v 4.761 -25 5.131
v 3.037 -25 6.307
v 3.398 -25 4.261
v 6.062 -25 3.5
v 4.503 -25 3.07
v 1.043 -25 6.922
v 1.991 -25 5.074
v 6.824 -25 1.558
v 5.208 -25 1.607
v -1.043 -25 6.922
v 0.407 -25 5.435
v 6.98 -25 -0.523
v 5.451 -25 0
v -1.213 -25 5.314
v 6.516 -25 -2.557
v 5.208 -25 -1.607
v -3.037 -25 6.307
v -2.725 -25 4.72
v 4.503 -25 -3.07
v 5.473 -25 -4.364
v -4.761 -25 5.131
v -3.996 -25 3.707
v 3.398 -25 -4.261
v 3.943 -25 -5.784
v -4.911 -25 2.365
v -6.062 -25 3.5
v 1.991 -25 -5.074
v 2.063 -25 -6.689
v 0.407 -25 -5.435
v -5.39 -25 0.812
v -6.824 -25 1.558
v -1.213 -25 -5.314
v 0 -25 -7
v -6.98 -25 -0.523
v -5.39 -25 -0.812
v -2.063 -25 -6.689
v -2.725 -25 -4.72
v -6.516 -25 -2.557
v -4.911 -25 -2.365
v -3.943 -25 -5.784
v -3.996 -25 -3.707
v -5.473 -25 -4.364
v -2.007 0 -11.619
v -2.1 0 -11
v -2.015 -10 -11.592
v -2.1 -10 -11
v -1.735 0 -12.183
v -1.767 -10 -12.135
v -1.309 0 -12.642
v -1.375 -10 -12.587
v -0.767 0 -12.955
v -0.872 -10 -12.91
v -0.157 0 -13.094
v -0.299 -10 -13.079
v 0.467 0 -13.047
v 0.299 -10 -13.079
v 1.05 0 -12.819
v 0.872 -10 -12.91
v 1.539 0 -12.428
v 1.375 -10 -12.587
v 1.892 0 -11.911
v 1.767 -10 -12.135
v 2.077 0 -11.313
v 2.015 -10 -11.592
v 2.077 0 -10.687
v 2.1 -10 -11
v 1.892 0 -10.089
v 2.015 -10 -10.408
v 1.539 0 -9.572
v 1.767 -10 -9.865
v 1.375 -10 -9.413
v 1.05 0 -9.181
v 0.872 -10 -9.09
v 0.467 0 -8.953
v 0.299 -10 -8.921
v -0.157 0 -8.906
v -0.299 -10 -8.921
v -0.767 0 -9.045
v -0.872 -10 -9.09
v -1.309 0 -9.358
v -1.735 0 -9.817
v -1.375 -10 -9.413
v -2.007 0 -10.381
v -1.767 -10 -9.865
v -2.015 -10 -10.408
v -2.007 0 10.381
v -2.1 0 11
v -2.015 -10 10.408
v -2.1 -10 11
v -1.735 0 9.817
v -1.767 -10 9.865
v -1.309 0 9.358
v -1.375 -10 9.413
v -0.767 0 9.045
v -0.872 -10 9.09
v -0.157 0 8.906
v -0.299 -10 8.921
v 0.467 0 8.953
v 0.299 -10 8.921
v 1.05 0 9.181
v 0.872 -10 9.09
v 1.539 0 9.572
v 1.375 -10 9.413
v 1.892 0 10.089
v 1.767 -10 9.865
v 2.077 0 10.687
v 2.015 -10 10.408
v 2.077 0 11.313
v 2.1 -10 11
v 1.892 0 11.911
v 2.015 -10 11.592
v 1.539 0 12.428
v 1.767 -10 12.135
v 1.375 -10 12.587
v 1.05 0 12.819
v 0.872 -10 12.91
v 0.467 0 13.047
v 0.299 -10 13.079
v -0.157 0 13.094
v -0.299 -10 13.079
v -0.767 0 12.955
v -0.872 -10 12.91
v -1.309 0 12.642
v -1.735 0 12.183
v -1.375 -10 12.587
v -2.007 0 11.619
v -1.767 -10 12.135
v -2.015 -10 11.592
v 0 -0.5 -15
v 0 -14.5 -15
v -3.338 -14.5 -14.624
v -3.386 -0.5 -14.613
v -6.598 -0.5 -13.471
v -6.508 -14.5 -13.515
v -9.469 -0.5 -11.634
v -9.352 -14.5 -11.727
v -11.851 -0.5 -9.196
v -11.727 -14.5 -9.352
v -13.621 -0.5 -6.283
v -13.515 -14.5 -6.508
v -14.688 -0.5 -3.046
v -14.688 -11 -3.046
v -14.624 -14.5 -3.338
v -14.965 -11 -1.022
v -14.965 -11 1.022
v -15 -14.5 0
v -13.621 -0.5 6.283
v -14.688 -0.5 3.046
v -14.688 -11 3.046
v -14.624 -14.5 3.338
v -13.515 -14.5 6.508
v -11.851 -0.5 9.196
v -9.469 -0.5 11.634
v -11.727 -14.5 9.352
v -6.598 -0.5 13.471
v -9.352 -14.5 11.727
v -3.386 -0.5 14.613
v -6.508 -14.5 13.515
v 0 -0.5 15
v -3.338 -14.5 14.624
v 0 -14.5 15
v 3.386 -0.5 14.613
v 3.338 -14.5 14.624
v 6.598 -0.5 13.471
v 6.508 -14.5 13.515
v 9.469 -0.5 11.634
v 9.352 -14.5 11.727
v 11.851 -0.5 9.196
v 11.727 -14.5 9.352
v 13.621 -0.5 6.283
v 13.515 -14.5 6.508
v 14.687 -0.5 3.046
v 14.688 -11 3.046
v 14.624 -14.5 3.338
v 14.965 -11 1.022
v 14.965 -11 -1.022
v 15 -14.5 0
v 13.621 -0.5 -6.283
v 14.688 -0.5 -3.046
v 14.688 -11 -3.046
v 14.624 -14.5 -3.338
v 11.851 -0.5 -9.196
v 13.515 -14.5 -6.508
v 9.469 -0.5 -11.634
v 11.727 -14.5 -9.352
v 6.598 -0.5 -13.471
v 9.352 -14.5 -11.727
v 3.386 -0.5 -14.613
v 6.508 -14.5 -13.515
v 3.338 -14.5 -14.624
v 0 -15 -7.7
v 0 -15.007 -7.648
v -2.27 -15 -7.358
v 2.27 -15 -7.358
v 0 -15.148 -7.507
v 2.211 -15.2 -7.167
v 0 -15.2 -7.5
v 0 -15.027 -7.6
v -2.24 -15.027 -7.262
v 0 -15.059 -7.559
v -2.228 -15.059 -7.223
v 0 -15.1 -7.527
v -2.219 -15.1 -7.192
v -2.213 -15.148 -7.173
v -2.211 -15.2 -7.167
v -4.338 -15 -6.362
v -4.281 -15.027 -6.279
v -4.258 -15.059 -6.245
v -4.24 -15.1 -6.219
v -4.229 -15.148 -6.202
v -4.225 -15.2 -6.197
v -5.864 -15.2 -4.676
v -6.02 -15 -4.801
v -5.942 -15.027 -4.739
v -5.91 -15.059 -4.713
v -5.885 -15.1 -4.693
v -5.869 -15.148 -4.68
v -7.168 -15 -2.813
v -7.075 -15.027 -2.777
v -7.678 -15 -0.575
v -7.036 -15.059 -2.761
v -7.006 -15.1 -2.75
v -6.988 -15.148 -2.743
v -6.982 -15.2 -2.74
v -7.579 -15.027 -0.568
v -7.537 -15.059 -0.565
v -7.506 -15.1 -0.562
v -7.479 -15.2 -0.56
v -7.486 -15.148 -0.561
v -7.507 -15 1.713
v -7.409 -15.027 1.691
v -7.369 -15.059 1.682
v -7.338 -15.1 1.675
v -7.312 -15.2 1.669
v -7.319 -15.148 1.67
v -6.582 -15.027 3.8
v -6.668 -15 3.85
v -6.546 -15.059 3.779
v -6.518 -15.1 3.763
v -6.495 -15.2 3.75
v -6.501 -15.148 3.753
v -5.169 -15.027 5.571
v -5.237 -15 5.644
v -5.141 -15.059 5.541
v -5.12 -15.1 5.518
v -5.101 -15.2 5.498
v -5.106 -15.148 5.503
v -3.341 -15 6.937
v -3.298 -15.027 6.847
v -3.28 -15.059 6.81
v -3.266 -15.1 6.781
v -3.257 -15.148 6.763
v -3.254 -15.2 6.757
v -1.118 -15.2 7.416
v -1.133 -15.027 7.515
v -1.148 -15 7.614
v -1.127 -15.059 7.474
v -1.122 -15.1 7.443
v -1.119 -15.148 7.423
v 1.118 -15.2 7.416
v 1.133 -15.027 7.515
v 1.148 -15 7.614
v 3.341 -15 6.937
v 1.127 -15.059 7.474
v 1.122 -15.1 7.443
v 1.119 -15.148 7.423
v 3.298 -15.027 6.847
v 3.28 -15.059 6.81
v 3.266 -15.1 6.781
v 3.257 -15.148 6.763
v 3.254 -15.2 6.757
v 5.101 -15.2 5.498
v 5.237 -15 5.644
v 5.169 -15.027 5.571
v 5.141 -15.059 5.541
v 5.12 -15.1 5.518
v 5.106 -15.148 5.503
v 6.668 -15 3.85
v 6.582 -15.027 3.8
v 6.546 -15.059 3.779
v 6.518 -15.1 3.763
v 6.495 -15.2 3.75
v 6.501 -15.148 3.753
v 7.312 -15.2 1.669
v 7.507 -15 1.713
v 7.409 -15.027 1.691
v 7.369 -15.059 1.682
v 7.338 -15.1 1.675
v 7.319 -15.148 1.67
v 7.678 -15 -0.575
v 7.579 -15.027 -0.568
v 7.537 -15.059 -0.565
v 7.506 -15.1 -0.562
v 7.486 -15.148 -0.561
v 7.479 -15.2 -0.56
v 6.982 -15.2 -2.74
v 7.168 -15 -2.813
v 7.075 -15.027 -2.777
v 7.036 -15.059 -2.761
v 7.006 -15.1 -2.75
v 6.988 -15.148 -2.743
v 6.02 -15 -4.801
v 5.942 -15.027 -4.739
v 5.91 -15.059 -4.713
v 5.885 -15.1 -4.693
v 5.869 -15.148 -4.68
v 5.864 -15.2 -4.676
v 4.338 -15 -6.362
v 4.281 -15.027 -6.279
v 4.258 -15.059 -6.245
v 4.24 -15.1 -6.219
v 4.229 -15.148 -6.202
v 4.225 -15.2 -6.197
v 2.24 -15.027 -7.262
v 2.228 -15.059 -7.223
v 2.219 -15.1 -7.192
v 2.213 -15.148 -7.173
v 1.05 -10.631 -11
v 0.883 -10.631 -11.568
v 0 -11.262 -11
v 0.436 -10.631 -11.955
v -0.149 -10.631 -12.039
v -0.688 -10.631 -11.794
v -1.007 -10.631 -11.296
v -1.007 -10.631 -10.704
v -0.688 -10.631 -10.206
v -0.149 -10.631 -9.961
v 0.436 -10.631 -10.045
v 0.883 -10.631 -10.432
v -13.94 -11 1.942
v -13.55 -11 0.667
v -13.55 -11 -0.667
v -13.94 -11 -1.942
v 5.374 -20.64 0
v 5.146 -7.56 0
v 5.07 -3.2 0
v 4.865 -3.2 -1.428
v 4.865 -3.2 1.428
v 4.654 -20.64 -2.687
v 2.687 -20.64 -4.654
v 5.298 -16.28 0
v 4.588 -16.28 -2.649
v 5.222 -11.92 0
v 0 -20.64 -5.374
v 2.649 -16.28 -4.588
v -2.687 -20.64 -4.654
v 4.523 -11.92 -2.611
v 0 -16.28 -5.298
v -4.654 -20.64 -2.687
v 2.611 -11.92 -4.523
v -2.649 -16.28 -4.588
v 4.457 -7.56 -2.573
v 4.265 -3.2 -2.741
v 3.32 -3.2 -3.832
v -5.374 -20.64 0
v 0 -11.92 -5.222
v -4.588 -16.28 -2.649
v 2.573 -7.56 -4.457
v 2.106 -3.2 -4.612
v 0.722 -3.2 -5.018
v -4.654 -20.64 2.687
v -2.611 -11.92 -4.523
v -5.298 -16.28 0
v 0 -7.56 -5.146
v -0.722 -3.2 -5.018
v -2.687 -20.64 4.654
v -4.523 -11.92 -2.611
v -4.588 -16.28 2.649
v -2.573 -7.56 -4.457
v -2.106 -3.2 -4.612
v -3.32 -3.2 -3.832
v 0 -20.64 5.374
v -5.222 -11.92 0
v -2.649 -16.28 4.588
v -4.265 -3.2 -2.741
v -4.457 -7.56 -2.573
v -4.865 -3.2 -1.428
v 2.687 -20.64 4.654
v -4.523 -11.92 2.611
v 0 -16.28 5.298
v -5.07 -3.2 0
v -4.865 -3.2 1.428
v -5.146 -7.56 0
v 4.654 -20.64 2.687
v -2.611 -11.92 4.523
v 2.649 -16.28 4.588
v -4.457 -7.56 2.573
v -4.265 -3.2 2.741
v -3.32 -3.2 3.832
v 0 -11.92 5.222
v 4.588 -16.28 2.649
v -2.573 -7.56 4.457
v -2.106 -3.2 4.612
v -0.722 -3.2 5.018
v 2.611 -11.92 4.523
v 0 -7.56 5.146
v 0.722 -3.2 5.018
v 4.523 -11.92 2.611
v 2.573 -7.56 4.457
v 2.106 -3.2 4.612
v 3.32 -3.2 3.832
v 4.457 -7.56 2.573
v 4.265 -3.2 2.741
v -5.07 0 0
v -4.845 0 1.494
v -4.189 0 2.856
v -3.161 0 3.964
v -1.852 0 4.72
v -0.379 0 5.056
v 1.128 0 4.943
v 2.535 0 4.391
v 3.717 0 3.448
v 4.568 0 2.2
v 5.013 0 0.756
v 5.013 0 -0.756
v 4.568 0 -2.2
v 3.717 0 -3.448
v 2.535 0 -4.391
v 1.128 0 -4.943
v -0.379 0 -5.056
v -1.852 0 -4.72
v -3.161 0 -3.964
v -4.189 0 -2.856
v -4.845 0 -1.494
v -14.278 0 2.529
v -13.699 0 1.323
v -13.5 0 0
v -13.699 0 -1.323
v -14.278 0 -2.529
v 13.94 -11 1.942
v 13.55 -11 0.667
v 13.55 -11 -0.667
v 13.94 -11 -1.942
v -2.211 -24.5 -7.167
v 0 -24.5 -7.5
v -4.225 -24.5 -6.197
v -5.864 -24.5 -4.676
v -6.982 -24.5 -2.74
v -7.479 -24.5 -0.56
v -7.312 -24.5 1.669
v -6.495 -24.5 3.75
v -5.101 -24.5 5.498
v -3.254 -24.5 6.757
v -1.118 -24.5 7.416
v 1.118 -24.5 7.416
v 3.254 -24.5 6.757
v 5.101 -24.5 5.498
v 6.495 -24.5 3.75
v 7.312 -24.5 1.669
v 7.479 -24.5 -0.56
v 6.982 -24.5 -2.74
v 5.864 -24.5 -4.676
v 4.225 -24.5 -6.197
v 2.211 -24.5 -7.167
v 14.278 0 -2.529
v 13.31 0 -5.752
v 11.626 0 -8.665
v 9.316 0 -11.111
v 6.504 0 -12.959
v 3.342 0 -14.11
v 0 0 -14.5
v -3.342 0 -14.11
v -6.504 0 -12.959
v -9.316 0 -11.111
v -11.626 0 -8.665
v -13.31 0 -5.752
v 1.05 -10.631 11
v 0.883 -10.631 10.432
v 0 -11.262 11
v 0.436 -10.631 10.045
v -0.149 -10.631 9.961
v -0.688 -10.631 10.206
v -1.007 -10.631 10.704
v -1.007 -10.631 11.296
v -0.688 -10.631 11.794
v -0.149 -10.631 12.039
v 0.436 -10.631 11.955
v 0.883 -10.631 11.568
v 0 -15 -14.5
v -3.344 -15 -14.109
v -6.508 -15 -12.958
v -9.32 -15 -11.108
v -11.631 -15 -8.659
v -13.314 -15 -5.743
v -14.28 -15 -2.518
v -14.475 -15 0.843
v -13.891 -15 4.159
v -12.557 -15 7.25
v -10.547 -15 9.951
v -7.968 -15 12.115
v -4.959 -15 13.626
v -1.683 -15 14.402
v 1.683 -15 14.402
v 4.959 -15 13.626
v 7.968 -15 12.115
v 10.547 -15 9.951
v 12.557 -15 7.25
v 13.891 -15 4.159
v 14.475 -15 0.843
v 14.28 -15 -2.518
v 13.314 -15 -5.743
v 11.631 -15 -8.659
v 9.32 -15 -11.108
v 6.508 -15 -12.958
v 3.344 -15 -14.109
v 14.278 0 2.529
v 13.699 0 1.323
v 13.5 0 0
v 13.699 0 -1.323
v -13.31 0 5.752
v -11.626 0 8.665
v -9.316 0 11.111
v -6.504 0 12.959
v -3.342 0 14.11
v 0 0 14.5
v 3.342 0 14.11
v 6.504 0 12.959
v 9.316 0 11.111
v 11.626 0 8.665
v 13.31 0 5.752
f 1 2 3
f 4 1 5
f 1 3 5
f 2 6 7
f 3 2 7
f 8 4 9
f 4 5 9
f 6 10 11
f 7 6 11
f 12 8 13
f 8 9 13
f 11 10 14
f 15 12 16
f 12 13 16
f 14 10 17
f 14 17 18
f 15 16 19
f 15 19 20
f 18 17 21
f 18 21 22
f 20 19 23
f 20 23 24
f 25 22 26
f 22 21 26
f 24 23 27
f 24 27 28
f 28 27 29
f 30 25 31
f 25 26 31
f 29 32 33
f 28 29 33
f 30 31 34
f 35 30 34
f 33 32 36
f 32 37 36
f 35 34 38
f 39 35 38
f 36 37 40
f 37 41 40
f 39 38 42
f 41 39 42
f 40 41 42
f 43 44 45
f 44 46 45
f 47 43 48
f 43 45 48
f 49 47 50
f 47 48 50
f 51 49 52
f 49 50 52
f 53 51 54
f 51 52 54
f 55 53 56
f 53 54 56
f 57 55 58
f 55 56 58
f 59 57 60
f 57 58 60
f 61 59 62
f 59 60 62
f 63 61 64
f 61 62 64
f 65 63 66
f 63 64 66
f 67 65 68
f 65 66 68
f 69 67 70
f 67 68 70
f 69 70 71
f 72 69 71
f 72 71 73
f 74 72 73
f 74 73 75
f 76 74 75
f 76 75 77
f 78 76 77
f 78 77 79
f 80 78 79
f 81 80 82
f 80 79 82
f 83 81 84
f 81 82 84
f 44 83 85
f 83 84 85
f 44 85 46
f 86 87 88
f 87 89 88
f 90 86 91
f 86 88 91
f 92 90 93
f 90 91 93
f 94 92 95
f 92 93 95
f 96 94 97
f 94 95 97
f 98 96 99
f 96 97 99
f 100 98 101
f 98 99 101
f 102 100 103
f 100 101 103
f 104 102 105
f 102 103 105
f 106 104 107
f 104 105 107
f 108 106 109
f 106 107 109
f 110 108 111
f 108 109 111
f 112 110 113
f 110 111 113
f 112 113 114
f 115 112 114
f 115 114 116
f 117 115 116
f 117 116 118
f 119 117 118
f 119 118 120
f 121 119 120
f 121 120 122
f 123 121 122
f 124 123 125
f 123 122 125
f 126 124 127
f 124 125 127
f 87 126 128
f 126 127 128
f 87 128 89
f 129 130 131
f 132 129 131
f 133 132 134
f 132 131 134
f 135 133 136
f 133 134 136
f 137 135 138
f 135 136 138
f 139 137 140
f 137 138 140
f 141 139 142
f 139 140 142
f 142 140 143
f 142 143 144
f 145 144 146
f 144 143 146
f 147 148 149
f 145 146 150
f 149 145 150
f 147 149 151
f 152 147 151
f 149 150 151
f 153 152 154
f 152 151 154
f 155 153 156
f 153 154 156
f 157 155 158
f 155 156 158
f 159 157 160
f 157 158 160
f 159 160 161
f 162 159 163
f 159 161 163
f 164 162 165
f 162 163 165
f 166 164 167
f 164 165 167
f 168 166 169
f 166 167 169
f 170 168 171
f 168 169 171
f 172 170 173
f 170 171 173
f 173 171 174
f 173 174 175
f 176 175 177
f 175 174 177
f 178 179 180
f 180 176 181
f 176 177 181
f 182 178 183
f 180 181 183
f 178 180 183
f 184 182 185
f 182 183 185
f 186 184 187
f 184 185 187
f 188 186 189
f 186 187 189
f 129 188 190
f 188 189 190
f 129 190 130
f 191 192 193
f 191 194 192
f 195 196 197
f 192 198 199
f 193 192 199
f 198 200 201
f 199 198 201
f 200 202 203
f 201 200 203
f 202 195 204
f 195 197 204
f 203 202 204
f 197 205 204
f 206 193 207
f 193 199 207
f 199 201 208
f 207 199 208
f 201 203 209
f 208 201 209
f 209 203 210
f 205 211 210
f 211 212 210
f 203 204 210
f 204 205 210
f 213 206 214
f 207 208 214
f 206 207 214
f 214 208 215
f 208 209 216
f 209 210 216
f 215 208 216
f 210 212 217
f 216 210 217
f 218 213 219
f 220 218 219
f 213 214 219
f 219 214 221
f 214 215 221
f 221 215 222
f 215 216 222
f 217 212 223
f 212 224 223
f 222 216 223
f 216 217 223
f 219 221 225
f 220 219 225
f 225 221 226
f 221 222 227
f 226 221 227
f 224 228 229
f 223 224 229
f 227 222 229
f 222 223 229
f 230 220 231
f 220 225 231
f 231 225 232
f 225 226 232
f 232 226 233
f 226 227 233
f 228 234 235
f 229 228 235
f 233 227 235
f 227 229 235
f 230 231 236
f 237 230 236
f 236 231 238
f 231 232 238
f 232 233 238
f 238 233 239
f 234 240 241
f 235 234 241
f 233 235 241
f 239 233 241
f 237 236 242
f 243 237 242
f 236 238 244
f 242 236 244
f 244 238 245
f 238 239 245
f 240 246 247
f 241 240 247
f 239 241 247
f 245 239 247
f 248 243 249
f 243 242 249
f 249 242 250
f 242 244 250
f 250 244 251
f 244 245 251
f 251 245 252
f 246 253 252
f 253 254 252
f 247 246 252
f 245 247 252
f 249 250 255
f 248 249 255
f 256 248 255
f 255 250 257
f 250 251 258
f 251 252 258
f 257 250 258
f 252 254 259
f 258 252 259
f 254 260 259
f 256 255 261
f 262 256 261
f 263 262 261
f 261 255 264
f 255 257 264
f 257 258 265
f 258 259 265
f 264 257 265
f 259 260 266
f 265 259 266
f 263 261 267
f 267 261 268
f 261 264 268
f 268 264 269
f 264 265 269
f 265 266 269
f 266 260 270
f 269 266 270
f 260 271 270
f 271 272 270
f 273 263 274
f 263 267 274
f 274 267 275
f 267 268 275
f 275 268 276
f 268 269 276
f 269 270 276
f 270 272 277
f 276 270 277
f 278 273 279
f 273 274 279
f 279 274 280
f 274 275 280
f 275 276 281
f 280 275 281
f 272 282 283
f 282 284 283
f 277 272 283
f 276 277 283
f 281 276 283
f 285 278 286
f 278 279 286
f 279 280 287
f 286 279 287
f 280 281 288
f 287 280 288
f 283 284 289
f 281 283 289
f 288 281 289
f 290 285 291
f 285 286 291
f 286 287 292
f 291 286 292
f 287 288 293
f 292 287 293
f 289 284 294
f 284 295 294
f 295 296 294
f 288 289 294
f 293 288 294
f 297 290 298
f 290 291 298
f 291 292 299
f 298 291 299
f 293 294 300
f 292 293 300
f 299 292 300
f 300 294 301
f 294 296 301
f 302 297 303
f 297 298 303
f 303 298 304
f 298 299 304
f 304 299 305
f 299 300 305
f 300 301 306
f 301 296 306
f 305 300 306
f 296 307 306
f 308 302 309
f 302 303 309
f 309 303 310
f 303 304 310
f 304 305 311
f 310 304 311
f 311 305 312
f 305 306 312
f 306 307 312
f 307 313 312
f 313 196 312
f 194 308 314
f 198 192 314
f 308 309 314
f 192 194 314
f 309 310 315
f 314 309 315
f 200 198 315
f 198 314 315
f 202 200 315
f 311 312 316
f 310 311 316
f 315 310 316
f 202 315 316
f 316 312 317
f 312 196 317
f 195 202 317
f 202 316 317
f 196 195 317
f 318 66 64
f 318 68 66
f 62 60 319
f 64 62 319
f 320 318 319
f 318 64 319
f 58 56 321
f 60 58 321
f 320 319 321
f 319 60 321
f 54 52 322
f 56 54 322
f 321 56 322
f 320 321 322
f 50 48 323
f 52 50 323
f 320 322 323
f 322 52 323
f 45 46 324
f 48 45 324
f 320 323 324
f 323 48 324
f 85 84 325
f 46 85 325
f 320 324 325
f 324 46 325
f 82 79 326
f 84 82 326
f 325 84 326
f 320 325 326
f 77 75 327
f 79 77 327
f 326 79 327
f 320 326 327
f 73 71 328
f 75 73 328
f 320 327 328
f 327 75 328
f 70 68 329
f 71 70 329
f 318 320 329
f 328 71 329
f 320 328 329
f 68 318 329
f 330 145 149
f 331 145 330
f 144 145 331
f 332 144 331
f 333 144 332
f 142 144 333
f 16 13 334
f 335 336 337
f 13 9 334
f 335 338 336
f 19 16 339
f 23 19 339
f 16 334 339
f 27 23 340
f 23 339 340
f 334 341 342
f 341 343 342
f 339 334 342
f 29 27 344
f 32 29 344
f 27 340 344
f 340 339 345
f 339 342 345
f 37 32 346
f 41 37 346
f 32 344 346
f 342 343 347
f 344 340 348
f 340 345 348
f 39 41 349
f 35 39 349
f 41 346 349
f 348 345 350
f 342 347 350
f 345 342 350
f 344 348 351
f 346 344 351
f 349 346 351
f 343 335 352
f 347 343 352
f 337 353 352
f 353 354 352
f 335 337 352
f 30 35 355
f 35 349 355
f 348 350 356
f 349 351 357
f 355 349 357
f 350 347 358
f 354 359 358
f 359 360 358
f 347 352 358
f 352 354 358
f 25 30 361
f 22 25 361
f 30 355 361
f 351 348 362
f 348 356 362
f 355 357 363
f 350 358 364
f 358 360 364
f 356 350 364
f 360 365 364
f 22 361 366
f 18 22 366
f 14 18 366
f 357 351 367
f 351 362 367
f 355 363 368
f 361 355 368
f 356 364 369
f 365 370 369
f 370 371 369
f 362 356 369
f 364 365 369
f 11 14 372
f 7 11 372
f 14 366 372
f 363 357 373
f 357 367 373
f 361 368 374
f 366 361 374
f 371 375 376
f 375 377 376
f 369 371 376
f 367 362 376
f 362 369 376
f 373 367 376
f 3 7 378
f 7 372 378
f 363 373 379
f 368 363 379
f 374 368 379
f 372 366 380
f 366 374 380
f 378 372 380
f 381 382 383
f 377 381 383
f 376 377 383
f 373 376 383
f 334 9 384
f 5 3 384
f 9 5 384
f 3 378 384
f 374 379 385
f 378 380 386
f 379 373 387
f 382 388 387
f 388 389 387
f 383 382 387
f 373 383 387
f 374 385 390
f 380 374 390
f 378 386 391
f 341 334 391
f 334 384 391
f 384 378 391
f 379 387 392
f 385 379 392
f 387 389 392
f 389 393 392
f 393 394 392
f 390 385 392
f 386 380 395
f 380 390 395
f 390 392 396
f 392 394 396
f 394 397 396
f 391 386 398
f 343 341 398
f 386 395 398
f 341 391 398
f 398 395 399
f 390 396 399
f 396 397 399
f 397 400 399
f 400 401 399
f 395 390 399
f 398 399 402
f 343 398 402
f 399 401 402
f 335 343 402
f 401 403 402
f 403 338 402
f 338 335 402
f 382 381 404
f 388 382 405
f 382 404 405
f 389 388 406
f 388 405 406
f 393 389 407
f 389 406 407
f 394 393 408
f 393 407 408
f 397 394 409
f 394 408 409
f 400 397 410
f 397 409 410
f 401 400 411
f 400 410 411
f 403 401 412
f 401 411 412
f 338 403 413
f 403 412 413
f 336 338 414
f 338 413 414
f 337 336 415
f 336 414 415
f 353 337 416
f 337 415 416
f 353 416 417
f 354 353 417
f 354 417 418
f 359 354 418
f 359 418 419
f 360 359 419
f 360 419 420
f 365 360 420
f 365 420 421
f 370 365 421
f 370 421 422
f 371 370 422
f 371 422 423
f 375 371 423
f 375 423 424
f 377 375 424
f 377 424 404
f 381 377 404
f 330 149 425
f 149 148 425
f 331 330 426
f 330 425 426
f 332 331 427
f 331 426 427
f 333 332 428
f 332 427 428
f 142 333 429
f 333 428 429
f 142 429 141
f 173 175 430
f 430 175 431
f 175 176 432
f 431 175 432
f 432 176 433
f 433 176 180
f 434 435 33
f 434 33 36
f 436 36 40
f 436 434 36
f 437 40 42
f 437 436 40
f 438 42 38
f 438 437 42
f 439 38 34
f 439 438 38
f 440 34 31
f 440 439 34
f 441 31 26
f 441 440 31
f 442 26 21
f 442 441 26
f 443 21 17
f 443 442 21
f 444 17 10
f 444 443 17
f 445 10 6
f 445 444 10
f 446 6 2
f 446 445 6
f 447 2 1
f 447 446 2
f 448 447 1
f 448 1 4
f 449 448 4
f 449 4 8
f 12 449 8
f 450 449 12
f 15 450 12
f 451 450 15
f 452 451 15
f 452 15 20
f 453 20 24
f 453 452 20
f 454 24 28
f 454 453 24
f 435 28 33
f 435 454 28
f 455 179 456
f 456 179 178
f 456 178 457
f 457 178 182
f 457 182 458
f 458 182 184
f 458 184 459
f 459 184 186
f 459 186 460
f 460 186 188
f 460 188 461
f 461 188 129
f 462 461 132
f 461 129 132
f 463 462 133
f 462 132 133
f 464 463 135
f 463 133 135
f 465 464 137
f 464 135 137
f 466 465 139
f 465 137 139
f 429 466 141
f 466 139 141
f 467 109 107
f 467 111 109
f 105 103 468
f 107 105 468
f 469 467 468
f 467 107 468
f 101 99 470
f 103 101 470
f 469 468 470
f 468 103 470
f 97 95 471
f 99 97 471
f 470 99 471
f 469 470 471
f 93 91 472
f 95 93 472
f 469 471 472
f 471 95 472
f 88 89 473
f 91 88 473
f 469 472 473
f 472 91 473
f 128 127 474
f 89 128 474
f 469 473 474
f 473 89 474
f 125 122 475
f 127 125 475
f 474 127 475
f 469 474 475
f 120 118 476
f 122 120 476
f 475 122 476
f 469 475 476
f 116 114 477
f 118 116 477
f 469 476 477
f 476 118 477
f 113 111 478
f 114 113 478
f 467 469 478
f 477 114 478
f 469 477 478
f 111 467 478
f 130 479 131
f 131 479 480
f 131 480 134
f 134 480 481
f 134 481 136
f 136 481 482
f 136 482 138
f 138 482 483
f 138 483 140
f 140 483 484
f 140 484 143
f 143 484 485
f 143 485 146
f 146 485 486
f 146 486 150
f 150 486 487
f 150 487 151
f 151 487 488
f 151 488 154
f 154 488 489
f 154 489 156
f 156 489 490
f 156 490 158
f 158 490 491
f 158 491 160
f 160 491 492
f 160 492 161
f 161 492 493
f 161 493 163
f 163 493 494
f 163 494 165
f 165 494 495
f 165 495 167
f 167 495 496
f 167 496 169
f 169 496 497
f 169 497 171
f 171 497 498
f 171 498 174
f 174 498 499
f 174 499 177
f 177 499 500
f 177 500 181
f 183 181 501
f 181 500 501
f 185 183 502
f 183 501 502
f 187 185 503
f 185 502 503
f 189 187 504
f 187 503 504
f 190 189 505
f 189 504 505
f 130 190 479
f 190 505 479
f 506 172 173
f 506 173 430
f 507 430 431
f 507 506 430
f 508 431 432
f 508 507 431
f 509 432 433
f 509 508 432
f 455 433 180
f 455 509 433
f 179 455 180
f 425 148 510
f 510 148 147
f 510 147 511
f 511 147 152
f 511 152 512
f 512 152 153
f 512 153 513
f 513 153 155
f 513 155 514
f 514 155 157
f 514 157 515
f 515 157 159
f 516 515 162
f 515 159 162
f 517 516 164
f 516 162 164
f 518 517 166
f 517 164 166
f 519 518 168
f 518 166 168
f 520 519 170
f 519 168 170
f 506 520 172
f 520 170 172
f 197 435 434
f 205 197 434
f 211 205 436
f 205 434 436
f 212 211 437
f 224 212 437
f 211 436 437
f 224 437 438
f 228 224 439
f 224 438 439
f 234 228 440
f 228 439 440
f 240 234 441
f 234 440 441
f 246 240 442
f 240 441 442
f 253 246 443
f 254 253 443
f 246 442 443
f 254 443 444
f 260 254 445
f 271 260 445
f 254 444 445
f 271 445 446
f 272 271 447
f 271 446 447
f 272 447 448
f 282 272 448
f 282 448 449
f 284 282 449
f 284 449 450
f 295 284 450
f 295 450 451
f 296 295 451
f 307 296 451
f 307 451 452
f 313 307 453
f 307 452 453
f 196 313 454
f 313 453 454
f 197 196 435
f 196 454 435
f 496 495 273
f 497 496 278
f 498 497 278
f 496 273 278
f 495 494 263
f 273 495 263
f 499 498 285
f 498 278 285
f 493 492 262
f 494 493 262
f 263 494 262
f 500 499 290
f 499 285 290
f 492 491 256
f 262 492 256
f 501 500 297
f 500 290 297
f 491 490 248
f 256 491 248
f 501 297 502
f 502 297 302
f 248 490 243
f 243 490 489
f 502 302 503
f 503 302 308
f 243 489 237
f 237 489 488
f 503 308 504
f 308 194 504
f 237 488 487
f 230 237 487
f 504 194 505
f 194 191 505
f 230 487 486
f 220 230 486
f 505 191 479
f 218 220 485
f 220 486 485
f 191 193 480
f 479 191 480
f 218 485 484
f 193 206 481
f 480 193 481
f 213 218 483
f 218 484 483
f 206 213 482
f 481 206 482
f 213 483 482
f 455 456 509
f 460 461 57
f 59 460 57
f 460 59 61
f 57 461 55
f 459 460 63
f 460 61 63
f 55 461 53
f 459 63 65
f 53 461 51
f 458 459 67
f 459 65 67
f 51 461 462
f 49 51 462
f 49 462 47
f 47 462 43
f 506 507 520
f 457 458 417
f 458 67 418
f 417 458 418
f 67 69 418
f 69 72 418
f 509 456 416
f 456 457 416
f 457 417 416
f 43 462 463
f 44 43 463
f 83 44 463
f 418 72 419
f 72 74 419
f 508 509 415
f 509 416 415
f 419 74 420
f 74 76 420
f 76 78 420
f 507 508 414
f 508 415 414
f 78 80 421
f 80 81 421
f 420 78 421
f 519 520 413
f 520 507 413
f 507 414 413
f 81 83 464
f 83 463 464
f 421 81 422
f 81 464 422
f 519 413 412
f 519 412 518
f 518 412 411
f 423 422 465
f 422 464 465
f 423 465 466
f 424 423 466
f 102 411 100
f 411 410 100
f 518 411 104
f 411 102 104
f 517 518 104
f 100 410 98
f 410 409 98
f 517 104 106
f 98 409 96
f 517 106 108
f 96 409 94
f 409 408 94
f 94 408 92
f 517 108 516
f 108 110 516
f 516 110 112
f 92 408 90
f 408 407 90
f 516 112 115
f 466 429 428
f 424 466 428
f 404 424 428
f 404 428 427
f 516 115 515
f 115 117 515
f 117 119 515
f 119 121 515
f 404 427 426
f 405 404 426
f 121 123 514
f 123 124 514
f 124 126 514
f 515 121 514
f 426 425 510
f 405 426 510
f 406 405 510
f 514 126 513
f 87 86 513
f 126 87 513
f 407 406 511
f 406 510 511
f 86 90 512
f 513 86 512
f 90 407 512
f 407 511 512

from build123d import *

# Parameters (mm, degrees)
SKETCH2_R             = 5.07
CUT_EXTRUDE1_DEPTH    = 33.787192622
CHAMFER1_SIZE         = 0.5
FILLET1_R             = 0.2
SKETCH3_R             = 4.5
CUT_EXTRUDE2_DEPTH    = 11
M5_TAPPED_HOLE1_D     = 4.2
M5_TAPPED_HOLE1_DEPTH = 10
M5_TAPPED_HOLE1_TIP   = 1.2618073


# Read off the part's stored shape, not the designer's step: Draft1
with BuildPart() as part:
    # Sketch1 → Revolve1 (revolve)
    with BuildSketch(Plane.XY, mode=Mode.PRIVATE) as revolve1_sk:
        Polygon((0, 0), (15, 0), (15, -15), (7.5, -15), (7.5, -25), (0, -25), align=None)
    revolve(revolve1_sk.sketch.rotate(Axis((0, -30, 0), (0, 1, 0)), 90), axis=Axis((0, -30, 0), (0, 1, 0)))

    # Sketch2 → Cut-Extrude1 (cut, through all)
    with BuildSketch(Plane(origin=(0, 0, 0), x_dir=(1, 0, 0), z_dir=(0, 1, 0))):
        with Locations(Location((0, 0, 0), (0, 0, 180))):
            Circle(SKETCH2_R)
    extrude(amount=-CUT_EXTRUDE1_DEPTH, mode=Mode.SUBTRACT)

    # Chamfer1
    chamfer1_edges = [part.edges().sort_by_distance(p)[0] for p in [
        (0, -25, 7.5),
        (0, -15, 15),
        (0, 0, 15),
    ]]
    chamfer(chamfer1_edges, length=CHAMFER1_SIZE)

    # Fillet1
    fillet1_edges = [part.edges().sort_by_distance(p)[0] for p in [
        (0, -15, 7.5),
    ]]
    fillet(fillet1_edges, radius=FILLET1_R)

    # Draft1 outline → Draft1 (revolve, cut)
    with BuildSketch(Plane.XY):
        Polygon((5.450520415, -25), (5.07, -3.2), (5.07, -25), align=None)
    revolve(axis=Axis((0, 0, 0), (0, 1, 0)), mode=Mode.SUBTRACT)

    # Sketch3 → Cut-Extrude2 (cut)
    with BuildSketch(Plane(origin=(0, 0, 0), x_dir=(1, 0, 0), z_dir=(0, 1, 0))):
        with Locations((-18, 0)):
            Circle(SKETCH3_R)
    cut_extrude2 = extrude(amount=-CUT_EXTRUDE2_DEPTH, mode=Mode.SUBTRACT)

    # Mirror1: Cut-Extrude2 across plane
    add(cut_extrude2.mirror(Plane(origin=(0, 0, 0), x_dir=(0, 0, 1), z_dir=(1, 0, 0))), mode=Mode.SUBTRACT)

    # M5 Tapped Hole1
    with Locations(Plane(origin=(0, 0, 0), x_dir=(1, 0, 0), z_dir=(0, 1, 0))):
        with Locations((0, 11), (0, -11)):
            Hole(M5_TAPPED_HOLE1_D / 2, depth=M5_TAPPED_HOLE1_DEPTH)
            with Locations((0, 0, -(M5_TAPPED_HOLE1_DEPTH + M5_TAPPED_HOLE1_TIP / 2))):  # 118° drill point
                Cone(0, M5_TAPPED_HOLE1_D / 2, M5_TAPPED_HOLE1_TIP, mode=Mode.SUBTRACT)


solid = part.part
